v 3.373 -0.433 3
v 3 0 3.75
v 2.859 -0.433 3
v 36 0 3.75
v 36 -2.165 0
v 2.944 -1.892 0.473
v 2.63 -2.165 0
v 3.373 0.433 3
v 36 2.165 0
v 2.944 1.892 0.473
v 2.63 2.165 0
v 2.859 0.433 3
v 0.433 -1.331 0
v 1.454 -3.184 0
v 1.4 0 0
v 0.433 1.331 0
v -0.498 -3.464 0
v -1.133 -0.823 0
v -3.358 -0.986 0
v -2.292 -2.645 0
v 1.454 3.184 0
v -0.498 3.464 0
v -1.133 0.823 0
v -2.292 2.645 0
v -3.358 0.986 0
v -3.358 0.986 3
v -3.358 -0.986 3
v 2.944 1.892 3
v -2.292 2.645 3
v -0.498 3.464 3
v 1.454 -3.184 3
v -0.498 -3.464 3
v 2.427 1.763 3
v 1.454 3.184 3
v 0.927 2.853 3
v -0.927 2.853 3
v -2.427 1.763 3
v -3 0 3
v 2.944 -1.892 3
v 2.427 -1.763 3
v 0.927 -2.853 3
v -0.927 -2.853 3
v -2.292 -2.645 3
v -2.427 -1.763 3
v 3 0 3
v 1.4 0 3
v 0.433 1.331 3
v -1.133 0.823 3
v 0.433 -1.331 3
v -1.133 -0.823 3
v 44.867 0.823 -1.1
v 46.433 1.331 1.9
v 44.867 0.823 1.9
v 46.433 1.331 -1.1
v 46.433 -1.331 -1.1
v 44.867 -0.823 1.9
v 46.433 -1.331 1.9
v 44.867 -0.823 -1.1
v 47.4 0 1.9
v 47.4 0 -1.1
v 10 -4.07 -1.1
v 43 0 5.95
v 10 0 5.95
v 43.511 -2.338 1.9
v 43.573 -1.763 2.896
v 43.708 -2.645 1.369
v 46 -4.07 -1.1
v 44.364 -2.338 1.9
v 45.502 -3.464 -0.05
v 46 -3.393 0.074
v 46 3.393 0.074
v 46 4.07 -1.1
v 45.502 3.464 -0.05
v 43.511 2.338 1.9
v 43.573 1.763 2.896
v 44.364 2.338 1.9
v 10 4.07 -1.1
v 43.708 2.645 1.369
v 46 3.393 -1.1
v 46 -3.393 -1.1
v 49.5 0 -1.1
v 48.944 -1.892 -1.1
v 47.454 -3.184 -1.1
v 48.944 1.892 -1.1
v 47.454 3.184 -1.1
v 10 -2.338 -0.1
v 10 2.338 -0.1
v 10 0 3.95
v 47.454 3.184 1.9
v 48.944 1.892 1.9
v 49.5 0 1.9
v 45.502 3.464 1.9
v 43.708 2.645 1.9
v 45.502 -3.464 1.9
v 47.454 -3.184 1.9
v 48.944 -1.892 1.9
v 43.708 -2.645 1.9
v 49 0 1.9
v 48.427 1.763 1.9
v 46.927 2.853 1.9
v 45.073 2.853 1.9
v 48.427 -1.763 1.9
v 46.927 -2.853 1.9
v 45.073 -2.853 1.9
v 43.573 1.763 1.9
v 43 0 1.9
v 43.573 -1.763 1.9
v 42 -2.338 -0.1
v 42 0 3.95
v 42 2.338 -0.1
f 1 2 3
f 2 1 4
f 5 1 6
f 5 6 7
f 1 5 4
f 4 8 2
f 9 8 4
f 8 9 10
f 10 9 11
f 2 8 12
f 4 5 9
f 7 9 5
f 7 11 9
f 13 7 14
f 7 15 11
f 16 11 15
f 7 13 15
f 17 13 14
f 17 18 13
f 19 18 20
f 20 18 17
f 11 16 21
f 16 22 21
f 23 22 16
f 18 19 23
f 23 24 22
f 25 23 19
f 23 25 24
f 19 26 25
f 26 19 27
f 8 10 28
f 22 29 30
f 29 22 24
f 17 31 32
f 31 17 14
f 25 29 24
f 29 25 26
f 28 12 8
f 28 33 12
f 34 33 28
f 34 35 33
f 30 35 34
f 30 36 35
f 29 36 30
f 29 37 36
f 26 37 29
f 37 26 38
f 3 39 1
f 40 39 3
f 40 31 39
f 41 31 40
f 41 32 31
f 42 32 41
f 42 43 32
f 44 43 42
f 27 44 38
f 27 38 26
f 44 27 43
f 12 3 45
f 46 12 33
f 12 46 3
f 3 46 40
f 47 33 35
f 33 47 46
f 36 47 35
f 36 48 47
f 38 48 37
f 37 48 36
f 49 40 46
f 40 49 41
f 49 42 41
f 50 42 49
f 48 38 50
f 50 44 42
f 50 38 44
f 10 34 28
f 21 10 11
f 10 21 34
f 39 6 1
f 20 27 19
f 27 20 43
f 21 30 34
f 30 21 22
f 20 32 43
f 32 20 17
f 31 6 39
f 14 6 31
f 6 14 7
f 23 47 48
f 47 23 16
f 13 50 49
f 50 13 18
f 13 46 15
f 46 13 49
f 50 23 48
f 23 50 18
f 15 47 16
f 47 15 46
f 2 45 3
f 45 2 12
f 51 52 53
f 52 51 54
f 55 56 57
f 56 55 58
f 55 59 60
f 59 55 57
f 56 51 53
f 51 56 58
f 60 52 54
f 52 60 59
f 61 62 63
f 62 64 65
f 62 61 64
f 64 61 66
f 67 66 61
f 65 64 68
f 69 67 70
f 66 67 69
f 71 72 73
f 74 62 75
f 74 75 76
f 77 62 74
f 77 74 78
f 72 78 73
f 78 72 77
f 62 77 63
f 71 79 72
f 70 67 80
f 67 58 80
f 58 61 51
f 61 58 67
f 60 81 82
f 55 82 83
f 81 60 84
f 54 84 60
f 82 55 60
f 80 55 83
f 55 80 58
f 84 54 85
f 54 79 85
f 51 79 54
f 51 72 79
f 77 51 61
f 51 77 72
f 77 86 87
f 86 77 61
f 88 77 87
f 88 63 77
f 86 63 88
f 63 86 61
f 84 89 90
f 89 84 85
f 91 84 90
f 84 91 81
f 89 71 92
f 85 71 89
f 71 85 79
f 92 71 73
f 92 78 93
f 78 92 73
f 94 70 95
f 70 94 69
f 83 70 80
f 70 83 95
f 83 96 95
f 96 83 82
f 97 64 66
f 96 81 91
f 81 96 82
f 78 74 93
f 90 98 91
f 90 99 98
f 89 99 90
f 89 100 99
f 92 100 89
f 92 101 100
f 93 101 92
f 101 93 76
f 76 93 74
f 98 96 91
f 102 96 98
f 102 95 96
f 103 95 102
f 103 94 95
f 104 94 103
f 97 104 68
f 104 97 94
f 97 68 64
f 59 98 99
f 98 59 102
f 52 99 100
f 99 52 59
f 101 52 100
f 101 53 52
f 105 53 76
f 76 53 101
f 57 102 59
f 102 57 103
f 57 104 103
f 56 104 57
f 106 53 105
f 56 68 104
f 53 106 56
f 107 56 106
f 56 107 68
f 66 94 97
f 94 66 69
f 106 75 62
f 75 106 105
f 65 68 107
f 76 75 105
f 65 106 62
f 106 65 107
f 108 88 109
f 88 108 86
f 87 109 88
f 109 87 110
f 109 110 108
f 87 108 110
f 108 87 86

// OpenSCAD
// file: common_parts.scad
include <tunable_constants.scad>;
common_flat_screw_tap();
module common_flat_screw_tap(l = 10, l2 = 0) {
    // l2 is amount of the screw that are bigger for sliding through the hole
    tap_z = 1.9;
    union() {
        cylinder(d = C_M3_DIAMETER_THREAD, h= l);
        cylinder(d = C_M3_DIAMETER, h= l2);
        translate([0,0,-0.1+0.1]) cylinder(d1 = 6.5, d2= C_M3_DIAMETER_THREAD, h= tap_z);
        translate([0,0,-0.1]) cylinder(d = 6.5, h= 0.3);
    }
}

module common_button_screw_tap(l = 10, l2 = 0) {
    
    tap_z = 1.1;
    union() {
        cylinder(d = C_M3_DIAMETER_THREAD, h= l);
        cylinder(d = C_M3_DIAMETER, h= l2);
        translate([0,0,-4]) cylinder(d = 6, h=4);
    }
}

module roundedcube(xdim ,ydim ,zdim,rdim){
    hull(){
        fn=30;
        translate([rdim,rdim,0]) cylinder(r=rdim, h=zdim, $fn=fn);
        translate([xdim-rdim,rdim,0])cylinder(r=rdim, h=zdim, $fn=fn);

        translate([rdim,ydim-rdim,0]) cylinder(r=rdim, h=zdim, $fn=fn);
        translate([xdim-rdim,ydim-rdim,0]) cylinder(r=rdim, h=zdim, $fn=fn);
    }
}

module cylinder_outer(height,radius,fn){
   fudge = 1/cos(180/fn);
   cylinder(h=height,r=radius*fudge,$fn=fn);
}
// file: tunable_constants.scad
// Change parameters to fit your printer and slicer differences

C_M3_DIAMETER = 3.1; // size of a hole that a M3 screw will slide through
C_M3_DIAMETER_THREAD = 2.8; // size of a hole that a M3 screw will create own threads in

C_M3_NUT = 7;

C_KINGPIN_LOOSE = 3.5; // The hole for kingpin in the arms that are suposed to slide
C_KINGPIN_SNUG = 3.3; // The hole in the steering hub where the kingpin is suposed to be tightly locked with a screw

C_M4_NUT = 8.4;

C_M4_DIAMETER = 4.1; // size of a hole that a M4 screw will slide through
C_M4_DIAMETER_THREAD = 3.8; // size of a hole that a M4 screw will create own threads in

    b_12mm_tol = 0.3; // tolerance for bearing with 12mm diameter

C_12MM_BEARING_D = 12+b_12mm_tol; // Size of a hole that hold a 12mm bearing
C_12MM_BEARING_H = 3.5;

C_8MM_LOOSE = 8.7; // Loose fitting that will guarantie that it will not touch
C_8MM_TIGHT = 8.2; // Tight fitting for indrive etc
C_8MM_FIT = 8.5; // Perfect fit for it to be removable but not by much force, used for left wheel mount
// main file
//
include <tunable_constants.scad>;
use <common_parts.scad>





damp_travel = 10; // travel lenght
damp_length = 46; // length from mounting screws
damp_wall = 2*2; // thickness of wall this is times 2 because a cylinder with 3 sides have half the radius;

tube_d = 5;
tube_gap = 0.4;

mount_h = 3;
fudge = 1/cos(180/3);


side_damp_in_p();
translate([0,0,-tube_gap/4-damp_wall/4]) side_damp_out_p();
%  all_screws();

module side_damp_in_p() {
    

    difference() {
        union() {
            translate([0,0,(tube_d/2)/fudge]) rotate([0,90,0]) rotate([0,0,120/2]) cylinder(d=tube_d, h=damp_length - damp_travel, $fn=3);
            
            cylinder(d=7, h=3);
        }
        
         all_screws();
    }
    
}

module side_damp_out_p() {
     translate([0,0,tube_gap/4+damp_wall/4]) difference() {
        union() {
            translate([damp_length-(damp_length-damp_travel),0,(tube_d/2)/fudge]) rotate([0,90,0]) rotate([0,0,120/2]) cylinder(d=tube_d+tube_gap+damp_wall, h=damp_length - damp_travel, $fn=3);
            
            translate([damp_length, 0, -tube_gap/4-damp_wall/4]) cylinder(d=7, h=mount_h);
        }
        translate([damp_length, 0, -tube_gap/4-damp_wall/4+mount_h]) cylinder(d=6, h=20);
        translate([0,0,(tube_d/2)/fudge]) rotate([0,90,0]) rotate([0,0,120/2]) cylinder(d=tube_d+tube_gap, h=damp_length-4, $fn=3);
        
        all_screws();
    }
}
module all_screws() {
    translate([0, 0, mount_h]) rotate([180,0,0]) common_button_screw_tap(l = 8);
    
    translate([damp_length, 0, mount_h-tube_gap/4-damp_wall/4]) rotate([180,0,0]) common_button_screw_tap(l = 8);
}
